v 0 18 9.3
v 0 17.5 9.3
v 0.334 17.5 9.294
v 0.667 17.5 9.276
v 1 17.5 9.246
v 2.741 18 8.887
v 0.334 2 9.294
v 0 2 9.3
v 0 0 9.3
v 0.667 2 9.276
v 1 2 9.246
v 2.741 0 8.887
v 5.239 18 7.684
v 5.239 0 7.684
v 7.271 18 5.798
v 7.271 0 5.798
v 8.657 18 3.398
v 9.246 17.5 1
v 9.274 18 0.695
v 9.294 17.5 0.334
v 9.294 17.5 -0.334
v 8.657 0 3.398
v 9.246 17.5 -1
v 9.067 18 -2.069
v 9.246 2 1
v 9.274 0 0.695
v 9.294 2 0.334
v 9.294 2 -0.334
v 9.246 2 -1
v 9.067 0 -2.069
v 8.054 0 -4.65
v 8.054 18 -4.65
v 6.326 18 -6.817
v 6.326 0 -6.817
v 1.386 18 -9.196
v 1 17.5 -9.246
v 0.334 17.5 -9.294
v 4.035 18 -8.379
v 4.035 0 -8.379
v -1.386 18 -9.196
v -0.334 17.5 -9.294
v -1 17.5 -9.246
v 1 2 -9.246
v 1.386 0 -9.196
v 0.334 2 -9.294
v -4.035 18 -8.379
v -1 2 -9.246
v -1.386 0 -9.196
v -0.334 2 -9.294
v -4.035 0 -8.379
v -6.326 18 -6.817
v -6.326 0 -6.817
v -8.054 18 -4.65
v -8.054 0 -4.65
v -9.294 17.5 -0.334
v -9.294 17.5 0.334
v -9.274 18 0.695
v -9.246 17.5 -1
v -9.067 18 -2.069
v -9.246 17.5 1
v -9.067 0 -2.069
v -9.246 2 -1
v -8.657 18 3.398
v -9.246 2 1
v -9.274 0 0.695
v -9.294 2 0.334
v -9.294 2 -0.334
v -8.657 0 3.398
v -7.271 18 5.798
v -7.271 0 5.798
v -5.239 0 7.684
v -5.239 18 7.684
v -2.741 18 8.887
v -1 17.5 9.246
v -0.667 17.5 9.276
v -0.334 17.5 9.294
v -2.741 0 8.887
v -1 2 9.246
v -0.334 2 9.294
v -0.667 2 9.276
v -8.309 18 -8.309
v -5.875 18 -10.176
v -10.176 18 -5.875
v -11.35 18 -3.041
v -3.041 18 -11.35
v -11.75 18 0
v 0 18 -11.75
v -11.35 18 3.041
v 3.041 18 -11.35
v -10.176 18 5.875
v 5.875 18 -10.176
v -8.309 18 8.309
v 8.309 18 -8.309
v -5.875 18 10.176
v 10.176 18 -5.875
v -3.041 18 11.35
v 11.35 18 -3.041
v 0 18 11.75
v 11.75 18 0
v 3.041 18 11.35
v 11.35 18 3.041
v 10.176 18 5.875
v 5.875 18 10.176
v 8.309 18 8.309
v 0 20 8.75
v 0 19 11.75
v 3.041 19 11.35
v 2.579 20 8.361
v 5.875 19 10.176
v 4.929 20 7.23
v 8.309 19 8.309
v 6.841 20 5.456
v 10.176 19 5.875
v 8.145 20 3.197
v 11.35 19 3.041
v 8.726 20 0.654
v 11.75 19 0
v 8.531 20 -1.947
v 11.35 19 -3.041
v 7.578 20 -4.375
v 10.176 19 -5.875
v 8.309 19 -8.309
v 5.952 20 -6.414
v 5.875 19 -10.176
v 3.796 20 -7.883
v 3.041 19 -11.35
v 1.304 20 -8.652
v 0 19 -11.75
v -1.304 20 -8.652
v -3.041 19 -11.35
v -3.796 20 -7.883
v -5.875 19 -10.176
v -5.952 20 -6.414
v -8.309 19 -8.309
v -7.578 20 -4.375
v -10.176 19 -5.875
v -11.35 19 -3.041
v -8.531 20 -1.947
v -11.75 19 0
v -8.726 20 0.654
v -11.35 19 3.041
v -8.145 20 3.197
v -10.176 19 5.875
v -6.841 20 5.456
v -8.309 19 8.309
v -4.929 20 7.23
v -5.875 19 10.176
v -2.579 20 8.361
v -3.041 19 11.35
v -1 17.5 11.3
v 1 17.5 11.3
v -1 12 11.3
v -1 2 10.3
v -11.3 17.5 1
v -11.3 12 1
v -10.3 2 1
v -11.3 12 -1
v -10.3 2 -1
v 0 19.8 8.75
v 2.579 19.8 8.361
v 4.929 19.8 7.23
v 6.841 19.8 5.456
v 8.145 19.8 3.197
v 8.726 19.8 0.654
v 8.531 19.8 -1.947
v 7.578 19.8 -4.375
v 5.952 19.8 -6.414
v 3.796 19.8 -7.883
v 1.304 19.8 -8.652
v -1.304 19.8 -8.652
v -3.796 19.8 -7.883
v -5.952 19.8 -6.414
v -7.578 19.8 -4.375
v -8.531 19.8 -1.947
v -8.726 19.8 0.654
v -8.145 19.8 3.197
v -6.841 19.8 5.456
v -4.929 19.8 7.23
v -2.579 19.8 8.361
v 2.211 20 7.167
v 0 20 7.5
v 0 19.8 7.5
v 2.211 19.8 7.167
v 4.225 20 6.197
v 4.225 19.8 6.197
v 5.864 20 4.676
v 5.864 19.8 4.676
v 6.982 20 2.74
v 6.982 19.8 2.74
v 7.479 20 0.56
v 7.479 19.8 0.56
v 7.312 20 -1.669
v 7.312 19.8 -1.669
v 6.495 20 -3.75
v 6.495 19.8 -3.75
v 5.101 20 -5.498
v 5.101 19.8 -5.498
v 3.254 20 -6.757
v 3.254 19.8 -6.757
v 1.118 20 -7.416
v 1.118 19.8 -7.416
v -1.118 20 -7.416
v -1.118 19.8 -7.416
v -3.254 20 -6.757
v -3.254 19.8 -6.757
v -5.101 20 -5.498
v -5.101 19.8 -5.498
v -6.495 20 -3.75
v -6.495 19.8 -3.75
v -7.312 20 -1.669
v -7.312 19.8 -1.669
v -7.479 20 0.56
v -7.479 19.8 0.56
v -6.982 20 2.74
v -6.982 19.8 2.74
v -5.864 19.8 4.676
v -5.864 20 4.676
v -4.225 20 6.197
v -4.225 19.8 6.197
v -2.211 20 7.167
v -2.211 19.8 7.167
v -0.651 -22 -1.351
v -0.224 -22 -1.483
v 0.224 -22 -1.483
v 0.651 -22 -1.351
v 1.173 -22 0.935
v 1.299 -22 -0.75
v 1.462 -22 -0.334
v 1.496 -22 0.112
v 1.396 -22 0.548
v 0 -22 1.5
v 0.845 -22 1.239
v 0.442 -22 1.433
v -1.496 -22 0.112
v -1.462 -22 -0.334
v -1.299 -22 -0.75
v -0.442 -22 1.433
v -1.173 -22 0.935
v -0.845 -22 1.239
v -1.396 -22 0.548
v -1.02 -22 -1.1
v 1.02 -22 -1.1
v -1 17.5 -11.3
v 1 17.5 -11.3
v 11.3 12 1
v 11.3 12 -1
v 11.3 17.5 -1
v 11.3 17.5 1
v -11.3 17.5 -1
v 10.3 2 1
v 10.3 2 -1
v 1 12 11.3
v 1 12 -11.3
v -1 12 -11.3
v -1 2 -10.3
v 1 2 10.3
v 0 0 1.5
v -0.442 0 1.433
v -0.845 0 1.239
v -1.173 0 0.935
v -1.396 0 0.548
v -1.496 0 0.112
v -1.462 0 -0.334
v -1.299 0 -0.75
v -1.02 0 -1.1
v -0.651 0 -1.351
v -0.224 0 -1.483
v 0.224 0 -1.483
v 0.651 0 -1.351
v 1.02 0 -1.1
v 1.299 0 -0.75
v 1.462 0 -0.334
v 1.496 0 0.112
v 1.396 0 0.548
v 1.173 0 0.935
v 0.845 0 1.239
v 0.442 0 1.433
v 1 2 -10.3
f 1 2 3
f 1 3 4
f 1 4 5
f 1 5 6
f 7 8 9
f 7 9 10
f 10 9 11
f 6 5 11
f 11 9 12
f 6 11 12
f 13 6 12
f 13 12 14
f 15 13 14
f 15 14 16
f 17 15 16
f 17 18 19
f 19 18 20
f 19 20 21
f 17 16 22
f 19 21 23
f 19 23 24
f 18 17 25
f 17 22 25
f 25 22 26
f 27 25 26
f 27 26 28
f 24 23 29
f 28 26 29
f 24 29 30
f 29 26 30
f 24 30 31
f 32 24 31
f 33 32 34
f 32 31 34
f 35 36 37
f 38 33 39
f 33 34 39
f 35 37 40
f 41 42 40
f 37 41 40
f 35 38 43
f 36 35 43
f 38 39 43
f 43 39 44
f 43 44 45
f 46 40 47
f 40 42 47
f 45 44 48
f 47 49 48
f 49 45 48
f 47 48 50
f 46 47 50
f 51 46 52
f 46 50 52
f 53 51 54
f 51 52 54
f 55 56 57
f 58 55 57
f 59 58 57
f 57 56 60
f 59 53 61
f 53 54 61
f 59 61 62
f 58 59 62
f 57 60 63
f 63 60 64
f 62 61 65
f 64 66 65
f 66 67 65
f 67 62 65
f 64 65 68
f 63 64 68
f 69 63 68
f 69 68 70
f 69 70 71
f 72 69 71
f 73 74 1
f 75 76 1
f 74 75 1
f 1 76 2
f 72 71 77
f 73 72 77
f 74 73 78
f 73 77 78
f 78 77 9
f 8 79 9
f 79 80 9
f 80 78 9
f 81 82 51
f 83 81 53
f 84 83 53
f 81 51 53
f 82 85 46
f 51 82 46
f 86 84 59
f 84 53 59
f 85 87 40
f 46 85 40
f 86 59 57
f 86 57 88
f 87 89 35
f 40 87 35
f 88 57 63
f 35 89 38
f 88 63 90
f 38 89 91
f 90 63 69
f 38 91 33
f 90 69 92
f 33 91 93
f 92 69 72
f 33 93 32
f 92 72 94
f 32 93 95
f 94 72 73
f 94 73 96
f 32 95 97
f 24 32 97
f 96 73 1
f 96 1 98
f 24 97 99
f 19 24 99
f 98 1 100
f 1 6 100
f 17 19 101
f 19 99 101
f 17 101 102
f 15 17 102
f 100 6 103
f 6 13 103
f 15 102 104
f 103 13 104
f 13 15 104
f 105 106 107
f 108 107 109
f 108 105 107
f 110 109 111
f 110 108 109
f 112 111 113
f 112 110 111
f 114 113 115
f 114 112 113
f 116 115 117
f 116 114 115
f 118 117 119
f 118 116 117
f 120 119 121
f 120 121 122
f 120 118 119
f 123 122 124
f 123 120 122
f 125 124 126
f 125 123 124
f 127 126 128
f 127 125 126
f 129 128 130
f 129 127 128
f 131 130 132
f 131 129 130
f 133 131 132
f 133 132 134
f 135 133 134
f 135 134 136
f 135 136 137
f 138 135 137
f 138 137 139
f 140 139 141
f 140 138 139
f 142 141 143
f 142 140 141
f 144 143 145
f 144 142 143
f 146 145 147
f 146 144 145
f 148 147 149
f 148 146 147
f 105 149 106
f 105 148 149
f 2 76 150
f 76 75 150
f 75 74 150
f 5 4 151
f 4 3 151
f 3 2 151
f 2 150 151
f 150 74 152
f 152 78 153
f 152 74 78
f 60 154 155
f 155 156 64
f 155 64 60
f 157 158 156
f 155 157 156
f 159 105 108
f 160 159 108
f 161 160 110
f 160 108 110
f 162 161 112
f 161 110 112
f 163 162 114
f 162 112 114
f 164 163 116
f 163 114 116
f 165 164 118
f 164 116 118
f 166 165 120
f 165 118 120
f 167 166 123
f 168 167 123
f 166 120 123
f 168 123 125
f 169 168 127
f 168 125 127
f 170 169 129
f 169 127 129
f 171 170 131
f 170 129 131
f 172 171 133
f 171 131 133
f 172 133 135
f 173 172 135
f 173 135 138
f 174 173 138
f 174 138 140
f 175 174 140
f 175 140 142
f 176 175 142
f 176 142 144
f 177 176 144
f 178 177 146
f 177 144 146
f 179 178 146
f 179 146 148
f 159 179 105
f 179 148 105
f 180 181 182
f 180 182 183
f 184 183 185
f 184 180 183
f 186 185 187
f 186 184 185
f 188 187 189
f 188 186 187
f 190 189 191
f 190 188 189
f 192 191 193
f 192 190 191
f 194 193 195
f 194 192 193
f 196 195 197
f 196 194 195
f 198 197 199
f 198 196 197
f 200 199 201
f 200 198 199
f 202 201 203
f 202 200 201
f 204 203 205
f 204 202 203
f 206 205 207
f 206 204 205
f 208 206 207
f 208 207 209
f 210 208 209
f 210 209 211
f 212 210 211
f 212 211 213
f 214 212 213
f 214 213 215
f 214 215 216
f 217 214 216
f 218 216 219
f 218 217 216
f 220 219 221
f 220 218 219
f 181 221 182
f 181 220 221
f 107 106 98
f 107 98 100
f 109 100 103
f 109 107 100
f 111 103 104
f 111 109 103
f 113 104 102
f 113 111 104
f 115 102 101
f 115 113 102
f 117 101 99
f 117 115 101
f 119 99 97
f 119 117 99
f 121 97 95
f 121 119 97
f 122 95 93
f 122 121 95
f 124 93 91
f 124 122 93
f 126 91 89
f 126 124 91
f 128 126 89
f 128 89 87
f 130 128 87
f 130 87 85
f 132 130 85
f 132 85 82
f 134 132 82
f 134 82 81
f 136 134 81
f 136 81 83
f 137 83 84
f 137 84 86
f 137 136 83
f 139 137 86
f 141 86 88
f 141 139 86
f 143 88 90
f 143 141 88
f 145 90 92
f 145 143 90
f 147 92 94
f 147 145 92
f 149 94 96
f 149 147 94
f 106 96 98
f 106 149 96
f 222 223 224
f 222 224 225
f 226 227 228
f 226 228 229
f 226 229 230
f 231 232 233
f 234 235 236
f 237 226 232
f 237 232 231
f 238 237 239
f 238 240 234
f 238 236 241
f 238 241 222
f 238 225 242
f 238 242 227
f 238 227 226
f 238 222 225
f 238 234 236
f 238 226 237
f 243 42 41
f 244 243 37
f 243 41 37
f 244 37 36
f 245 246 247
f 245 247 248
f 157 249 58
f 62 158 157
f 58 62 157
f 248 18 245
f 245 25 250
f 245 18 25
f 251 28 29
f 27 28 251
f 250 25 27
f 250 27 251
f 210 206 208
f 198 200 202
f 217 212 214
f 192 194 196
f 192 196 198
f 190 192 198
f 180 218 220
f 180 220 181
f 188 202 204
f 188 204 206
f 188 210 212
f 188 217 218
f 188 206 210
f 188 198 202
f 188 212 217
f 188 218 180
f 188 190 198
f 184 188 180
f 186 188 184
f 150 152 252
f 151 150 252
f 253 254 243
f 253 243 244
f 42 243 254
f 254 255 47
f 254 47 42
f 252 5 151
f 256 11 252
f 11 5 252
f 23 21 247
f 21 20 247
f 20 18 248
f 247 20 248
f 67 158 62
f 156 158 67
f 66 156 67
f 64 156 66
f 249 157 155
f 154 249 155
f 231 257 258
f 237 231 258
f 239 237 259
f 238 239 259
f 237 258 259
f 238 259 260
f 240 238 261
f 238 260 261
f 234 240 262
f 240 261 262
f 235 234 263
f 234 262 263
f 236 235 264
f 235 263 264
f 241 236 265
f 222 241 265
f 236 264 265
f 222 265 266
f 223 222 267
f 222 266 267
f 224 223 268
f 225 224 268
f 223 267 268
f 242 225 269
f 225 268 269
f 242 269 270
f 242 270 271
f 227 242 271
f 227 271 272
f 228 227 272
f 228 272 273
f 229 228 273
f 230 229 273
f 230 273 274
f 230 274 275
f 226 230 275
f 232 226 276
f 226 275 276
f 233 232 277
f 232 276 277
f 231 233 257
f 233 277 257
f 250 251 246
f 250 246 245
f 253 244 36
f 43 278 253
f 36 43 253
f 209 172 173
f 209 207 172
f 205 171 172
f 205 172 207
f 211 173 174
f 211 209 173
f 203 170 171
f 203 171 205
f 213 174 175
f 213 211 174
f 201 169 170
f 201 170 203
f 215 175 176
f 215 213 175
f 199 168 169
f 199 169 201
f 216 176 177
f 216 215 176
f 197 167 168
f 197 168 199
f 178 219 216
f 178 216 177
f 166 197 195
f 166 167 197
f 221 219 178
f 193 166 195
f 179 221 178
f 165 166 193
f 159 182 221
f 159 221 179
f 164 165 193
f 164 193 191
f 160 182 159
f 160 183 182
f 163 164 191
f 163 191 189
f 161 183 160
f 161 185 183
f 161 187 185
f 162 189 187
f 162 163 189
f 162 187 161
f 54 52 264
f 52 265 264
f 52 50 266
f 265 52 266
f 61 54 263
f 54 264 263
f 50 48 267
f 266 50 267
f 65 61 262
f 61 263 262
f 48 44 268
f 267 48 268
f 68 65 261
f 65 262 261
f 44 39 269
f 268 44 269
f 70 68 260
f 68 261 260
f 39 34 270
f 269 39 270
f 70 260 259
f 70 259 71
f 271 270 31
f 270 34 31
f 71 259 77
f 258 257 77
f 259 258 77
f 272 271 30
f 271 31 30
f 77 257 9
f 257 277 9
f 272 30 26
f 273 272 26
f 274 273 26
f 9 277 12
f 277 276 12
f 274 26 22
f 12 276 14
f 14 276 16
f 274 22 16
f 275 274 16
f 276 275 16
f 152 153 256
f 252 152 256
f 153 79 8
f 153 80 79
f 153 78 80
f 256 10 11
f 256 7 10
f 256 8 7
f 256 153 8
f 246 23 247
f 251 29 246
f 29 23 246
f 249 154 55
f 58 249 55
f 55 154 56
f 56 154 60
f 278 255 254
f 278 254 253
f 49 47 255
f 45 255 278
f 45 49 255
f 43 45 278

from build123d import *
from OCP.BRepFilletAPI import BRepFilletAPI_MakeChamfer

# Parameters (mm, degrees)
SKETCH_1_R          = 9.3
EXTRUDE_1_DEPTH     = 20
SKETCH_2_R          = 11.75
EXTRUDE_2_DEPTH     = 2
CHAMFER_1_SIZE      = 1
CHAMFER_1_SIZE2     = 3
SKETCH_3_R          = 1.5
EXTRUDE_3_DEPTH     = 22
EXTRUDE_START       = -2
SKETCH_4_W          = 2
SKETCH_4_H          = 4
SKETCH_4_W_2        = 4
SKETCH_4_H_2        = 2
EXTRUDE_4_DEPTH     = 15.5
CHAMFER_2_SIZE      = 10
CHAMFER_2_SIZE2     = 1
SKETCH_5_R          = 8.75
SKETCH_5_R_2        = 7.5
CUT_EXTRUDE_1_DEPTH = 0.2


with BuildPart() as part:
    # 草图1 → 凸台-拉伸1 (new body)
    with BuildSketch(Plane(origin=(0, 0, 0), x_dir=(1, 0, 0), z_dir=(0, 1, 0))):
        with Locations(Location((0, 0, 0), (0, 0, 270))):
            Circle(SKETCH_1_R)
    extrude(amount=EXTRUDE_1_DEPTH)

    # 草图2 → 凸台-拉伸2 (add)
    with BuildSketch(Plane(origin=(0, 20, 0), x_dir=(1, 0, 0), z_dir=(0, 1, 0))):
        with Locations(Location((0, 0, 0), (0, 0, 270))):
            Circle(SKETCH_2_R)
    extrude(amount=-EXTRUDE_2_DEPTH)

    # 倒角1
    chamfer_1_edges = [part.edges().sort_by_distance(p)[0] for p in [
        (0, 20, -11.75),
    ]]
    chamfer_1_side = [part.faces().sort_by_distance(p)[0] for p in [
        (0, 19, -11.75),
    ]]
    chamfer(chamfer_1_edges, length=CHAMFER_1_SIZE, length2=CHAMFER_1_SIZE2, reference=chamfer_1_side[0])

    # 草图3 → 凸台-拉伸3 (add)
    with BuildSketch(Plane.XZ):
        with Locations(Location((0, 0, 0), (0, 0, 90))):
            Circle(SKETCH_3_R)
    extrude(amount=EXTRUDE_3_DEPTH)

    # 草图4 → 凸台-拉伸4 (add)
    with BuildSketch(Plane.XZ.offset(EXTRUDE_START)):
        with Locations((0, 9.3)):
            Rectangle(SKETCH_4_W, SKETCH_4_H)
        with Locations((0, -9.3)):
            Rectangle(SKETCH_4_W, SKETCH_4_H)
        with Locations((-9.3, 0)):
            Rectangle(SKETCH_4_W_2, SKETCH_4_H_2)
        with Locations((9.3, 0)):
            Rectangle(SKETCH_4_W_2, SKETCH_4_H_2)
    extrude(amount=-EXTRUDE_4_DEPTH)

    # 倒角2: one chamfer whose edges measure the first distance from different faces: ONE call of the kernel's chamfer builder (chamfer() names one face for all edges)
    chamfer_2_edges_1 = [part.edges().sort_by_distance(p)[0] for p in [
        (0, 2, 11.3),
    ]]
    chamfer_2_side_1 = [part.faces().sort_by_distance(p)[0] for p in [
        (0, 9.75, 11.3),
    ]]
    chamfer_2_edges_2 = [part.edges().sort_by_distance(p)[0] for p in [
        (0, 2, -11.3),
    ]]
    chamfer_2_side_2 = [part.faces().sort_by_distance(p)[0] for p in [
        (0, 9.75, -11.3),
    ]]
    chamfer_2_edges_3 = [part.edges().sort_by_distance(p)[0] for p in [
        (-11.3, 2, 0),
    ]]
    chamfer_2_side_3 = [part.faces().sort_by_distance(p)[0] for p in [
        (-11.3, 9.75, 0),
    ]]
    chamfer_2_edges_4 = [part.edges().sort_by_distance(p)[0] for p in [
        (11.3, 2, 0),
    ]]
    chamfer_2_side_4 = [part.faces().sort_by_distance(p)[0] for p in [
        (11.3, 9.75, 0),
    ]]
    chamfer_2 = BRepFilletAPI_MakeChamfer(part.part.solid().wrapped)
    for e in chamfer_2_edges_1:
        chamfer_2.Add(CHAMFER_2_SIZE, CHAMFER_2_SIZE2, e.wrapped, chamfer_2_side_1[0].wrapped)  # the first distance lies on this face
    for e in chamfer_2_edges_2:
        chamfer_2.Add(CHAMFER_2_SIZE, CHAMFER_2_SIZE2, e.wrapped, chamfer_2_side_2[0].wrapped)  # the first distance lies on this face
    for e in chamfer_2_edges_3:
        chamfer_2.Add(CHAMFER_2_SIZE, CHAMFER_2_SIZE2, e.wrapped, chamfer_2_side_3[0].wrapped)  # the first distance lies on this face
    for e in chamfer_2_edges_4:
        chamfer_2.Add(CHAMFER_2_SIZE, CHAMFER_2_SIZE2, e.wrapped, chamfer_2_side_4[0].wrapped)  # the first distance lies on this face
    add(Compound.cast(chamfer_2.Shape()), mode=Mode.REPLACE)

    # 草图5 → 切除-拉伸1 (cut)
    with BuildSketch(Plane(origin=(0, 20, 0), x_dir=(1, 0, 0), z_dir=(0, 1, 0))):
        with Locations(Location((0, 0, 0), (0, 0, 270))):
            Circle(SKETCH_5_R)
        with Locations(Location((0, 0, 0), (0, 0, 270))):
            Circle(SKETCH_5_R_2, mode=Mode.SUBTRACT)
    extrude(amount=-CUT_EXTRUDE_1_DEPTH, mode=Mode.SUBTRACT)


solid = part.part
